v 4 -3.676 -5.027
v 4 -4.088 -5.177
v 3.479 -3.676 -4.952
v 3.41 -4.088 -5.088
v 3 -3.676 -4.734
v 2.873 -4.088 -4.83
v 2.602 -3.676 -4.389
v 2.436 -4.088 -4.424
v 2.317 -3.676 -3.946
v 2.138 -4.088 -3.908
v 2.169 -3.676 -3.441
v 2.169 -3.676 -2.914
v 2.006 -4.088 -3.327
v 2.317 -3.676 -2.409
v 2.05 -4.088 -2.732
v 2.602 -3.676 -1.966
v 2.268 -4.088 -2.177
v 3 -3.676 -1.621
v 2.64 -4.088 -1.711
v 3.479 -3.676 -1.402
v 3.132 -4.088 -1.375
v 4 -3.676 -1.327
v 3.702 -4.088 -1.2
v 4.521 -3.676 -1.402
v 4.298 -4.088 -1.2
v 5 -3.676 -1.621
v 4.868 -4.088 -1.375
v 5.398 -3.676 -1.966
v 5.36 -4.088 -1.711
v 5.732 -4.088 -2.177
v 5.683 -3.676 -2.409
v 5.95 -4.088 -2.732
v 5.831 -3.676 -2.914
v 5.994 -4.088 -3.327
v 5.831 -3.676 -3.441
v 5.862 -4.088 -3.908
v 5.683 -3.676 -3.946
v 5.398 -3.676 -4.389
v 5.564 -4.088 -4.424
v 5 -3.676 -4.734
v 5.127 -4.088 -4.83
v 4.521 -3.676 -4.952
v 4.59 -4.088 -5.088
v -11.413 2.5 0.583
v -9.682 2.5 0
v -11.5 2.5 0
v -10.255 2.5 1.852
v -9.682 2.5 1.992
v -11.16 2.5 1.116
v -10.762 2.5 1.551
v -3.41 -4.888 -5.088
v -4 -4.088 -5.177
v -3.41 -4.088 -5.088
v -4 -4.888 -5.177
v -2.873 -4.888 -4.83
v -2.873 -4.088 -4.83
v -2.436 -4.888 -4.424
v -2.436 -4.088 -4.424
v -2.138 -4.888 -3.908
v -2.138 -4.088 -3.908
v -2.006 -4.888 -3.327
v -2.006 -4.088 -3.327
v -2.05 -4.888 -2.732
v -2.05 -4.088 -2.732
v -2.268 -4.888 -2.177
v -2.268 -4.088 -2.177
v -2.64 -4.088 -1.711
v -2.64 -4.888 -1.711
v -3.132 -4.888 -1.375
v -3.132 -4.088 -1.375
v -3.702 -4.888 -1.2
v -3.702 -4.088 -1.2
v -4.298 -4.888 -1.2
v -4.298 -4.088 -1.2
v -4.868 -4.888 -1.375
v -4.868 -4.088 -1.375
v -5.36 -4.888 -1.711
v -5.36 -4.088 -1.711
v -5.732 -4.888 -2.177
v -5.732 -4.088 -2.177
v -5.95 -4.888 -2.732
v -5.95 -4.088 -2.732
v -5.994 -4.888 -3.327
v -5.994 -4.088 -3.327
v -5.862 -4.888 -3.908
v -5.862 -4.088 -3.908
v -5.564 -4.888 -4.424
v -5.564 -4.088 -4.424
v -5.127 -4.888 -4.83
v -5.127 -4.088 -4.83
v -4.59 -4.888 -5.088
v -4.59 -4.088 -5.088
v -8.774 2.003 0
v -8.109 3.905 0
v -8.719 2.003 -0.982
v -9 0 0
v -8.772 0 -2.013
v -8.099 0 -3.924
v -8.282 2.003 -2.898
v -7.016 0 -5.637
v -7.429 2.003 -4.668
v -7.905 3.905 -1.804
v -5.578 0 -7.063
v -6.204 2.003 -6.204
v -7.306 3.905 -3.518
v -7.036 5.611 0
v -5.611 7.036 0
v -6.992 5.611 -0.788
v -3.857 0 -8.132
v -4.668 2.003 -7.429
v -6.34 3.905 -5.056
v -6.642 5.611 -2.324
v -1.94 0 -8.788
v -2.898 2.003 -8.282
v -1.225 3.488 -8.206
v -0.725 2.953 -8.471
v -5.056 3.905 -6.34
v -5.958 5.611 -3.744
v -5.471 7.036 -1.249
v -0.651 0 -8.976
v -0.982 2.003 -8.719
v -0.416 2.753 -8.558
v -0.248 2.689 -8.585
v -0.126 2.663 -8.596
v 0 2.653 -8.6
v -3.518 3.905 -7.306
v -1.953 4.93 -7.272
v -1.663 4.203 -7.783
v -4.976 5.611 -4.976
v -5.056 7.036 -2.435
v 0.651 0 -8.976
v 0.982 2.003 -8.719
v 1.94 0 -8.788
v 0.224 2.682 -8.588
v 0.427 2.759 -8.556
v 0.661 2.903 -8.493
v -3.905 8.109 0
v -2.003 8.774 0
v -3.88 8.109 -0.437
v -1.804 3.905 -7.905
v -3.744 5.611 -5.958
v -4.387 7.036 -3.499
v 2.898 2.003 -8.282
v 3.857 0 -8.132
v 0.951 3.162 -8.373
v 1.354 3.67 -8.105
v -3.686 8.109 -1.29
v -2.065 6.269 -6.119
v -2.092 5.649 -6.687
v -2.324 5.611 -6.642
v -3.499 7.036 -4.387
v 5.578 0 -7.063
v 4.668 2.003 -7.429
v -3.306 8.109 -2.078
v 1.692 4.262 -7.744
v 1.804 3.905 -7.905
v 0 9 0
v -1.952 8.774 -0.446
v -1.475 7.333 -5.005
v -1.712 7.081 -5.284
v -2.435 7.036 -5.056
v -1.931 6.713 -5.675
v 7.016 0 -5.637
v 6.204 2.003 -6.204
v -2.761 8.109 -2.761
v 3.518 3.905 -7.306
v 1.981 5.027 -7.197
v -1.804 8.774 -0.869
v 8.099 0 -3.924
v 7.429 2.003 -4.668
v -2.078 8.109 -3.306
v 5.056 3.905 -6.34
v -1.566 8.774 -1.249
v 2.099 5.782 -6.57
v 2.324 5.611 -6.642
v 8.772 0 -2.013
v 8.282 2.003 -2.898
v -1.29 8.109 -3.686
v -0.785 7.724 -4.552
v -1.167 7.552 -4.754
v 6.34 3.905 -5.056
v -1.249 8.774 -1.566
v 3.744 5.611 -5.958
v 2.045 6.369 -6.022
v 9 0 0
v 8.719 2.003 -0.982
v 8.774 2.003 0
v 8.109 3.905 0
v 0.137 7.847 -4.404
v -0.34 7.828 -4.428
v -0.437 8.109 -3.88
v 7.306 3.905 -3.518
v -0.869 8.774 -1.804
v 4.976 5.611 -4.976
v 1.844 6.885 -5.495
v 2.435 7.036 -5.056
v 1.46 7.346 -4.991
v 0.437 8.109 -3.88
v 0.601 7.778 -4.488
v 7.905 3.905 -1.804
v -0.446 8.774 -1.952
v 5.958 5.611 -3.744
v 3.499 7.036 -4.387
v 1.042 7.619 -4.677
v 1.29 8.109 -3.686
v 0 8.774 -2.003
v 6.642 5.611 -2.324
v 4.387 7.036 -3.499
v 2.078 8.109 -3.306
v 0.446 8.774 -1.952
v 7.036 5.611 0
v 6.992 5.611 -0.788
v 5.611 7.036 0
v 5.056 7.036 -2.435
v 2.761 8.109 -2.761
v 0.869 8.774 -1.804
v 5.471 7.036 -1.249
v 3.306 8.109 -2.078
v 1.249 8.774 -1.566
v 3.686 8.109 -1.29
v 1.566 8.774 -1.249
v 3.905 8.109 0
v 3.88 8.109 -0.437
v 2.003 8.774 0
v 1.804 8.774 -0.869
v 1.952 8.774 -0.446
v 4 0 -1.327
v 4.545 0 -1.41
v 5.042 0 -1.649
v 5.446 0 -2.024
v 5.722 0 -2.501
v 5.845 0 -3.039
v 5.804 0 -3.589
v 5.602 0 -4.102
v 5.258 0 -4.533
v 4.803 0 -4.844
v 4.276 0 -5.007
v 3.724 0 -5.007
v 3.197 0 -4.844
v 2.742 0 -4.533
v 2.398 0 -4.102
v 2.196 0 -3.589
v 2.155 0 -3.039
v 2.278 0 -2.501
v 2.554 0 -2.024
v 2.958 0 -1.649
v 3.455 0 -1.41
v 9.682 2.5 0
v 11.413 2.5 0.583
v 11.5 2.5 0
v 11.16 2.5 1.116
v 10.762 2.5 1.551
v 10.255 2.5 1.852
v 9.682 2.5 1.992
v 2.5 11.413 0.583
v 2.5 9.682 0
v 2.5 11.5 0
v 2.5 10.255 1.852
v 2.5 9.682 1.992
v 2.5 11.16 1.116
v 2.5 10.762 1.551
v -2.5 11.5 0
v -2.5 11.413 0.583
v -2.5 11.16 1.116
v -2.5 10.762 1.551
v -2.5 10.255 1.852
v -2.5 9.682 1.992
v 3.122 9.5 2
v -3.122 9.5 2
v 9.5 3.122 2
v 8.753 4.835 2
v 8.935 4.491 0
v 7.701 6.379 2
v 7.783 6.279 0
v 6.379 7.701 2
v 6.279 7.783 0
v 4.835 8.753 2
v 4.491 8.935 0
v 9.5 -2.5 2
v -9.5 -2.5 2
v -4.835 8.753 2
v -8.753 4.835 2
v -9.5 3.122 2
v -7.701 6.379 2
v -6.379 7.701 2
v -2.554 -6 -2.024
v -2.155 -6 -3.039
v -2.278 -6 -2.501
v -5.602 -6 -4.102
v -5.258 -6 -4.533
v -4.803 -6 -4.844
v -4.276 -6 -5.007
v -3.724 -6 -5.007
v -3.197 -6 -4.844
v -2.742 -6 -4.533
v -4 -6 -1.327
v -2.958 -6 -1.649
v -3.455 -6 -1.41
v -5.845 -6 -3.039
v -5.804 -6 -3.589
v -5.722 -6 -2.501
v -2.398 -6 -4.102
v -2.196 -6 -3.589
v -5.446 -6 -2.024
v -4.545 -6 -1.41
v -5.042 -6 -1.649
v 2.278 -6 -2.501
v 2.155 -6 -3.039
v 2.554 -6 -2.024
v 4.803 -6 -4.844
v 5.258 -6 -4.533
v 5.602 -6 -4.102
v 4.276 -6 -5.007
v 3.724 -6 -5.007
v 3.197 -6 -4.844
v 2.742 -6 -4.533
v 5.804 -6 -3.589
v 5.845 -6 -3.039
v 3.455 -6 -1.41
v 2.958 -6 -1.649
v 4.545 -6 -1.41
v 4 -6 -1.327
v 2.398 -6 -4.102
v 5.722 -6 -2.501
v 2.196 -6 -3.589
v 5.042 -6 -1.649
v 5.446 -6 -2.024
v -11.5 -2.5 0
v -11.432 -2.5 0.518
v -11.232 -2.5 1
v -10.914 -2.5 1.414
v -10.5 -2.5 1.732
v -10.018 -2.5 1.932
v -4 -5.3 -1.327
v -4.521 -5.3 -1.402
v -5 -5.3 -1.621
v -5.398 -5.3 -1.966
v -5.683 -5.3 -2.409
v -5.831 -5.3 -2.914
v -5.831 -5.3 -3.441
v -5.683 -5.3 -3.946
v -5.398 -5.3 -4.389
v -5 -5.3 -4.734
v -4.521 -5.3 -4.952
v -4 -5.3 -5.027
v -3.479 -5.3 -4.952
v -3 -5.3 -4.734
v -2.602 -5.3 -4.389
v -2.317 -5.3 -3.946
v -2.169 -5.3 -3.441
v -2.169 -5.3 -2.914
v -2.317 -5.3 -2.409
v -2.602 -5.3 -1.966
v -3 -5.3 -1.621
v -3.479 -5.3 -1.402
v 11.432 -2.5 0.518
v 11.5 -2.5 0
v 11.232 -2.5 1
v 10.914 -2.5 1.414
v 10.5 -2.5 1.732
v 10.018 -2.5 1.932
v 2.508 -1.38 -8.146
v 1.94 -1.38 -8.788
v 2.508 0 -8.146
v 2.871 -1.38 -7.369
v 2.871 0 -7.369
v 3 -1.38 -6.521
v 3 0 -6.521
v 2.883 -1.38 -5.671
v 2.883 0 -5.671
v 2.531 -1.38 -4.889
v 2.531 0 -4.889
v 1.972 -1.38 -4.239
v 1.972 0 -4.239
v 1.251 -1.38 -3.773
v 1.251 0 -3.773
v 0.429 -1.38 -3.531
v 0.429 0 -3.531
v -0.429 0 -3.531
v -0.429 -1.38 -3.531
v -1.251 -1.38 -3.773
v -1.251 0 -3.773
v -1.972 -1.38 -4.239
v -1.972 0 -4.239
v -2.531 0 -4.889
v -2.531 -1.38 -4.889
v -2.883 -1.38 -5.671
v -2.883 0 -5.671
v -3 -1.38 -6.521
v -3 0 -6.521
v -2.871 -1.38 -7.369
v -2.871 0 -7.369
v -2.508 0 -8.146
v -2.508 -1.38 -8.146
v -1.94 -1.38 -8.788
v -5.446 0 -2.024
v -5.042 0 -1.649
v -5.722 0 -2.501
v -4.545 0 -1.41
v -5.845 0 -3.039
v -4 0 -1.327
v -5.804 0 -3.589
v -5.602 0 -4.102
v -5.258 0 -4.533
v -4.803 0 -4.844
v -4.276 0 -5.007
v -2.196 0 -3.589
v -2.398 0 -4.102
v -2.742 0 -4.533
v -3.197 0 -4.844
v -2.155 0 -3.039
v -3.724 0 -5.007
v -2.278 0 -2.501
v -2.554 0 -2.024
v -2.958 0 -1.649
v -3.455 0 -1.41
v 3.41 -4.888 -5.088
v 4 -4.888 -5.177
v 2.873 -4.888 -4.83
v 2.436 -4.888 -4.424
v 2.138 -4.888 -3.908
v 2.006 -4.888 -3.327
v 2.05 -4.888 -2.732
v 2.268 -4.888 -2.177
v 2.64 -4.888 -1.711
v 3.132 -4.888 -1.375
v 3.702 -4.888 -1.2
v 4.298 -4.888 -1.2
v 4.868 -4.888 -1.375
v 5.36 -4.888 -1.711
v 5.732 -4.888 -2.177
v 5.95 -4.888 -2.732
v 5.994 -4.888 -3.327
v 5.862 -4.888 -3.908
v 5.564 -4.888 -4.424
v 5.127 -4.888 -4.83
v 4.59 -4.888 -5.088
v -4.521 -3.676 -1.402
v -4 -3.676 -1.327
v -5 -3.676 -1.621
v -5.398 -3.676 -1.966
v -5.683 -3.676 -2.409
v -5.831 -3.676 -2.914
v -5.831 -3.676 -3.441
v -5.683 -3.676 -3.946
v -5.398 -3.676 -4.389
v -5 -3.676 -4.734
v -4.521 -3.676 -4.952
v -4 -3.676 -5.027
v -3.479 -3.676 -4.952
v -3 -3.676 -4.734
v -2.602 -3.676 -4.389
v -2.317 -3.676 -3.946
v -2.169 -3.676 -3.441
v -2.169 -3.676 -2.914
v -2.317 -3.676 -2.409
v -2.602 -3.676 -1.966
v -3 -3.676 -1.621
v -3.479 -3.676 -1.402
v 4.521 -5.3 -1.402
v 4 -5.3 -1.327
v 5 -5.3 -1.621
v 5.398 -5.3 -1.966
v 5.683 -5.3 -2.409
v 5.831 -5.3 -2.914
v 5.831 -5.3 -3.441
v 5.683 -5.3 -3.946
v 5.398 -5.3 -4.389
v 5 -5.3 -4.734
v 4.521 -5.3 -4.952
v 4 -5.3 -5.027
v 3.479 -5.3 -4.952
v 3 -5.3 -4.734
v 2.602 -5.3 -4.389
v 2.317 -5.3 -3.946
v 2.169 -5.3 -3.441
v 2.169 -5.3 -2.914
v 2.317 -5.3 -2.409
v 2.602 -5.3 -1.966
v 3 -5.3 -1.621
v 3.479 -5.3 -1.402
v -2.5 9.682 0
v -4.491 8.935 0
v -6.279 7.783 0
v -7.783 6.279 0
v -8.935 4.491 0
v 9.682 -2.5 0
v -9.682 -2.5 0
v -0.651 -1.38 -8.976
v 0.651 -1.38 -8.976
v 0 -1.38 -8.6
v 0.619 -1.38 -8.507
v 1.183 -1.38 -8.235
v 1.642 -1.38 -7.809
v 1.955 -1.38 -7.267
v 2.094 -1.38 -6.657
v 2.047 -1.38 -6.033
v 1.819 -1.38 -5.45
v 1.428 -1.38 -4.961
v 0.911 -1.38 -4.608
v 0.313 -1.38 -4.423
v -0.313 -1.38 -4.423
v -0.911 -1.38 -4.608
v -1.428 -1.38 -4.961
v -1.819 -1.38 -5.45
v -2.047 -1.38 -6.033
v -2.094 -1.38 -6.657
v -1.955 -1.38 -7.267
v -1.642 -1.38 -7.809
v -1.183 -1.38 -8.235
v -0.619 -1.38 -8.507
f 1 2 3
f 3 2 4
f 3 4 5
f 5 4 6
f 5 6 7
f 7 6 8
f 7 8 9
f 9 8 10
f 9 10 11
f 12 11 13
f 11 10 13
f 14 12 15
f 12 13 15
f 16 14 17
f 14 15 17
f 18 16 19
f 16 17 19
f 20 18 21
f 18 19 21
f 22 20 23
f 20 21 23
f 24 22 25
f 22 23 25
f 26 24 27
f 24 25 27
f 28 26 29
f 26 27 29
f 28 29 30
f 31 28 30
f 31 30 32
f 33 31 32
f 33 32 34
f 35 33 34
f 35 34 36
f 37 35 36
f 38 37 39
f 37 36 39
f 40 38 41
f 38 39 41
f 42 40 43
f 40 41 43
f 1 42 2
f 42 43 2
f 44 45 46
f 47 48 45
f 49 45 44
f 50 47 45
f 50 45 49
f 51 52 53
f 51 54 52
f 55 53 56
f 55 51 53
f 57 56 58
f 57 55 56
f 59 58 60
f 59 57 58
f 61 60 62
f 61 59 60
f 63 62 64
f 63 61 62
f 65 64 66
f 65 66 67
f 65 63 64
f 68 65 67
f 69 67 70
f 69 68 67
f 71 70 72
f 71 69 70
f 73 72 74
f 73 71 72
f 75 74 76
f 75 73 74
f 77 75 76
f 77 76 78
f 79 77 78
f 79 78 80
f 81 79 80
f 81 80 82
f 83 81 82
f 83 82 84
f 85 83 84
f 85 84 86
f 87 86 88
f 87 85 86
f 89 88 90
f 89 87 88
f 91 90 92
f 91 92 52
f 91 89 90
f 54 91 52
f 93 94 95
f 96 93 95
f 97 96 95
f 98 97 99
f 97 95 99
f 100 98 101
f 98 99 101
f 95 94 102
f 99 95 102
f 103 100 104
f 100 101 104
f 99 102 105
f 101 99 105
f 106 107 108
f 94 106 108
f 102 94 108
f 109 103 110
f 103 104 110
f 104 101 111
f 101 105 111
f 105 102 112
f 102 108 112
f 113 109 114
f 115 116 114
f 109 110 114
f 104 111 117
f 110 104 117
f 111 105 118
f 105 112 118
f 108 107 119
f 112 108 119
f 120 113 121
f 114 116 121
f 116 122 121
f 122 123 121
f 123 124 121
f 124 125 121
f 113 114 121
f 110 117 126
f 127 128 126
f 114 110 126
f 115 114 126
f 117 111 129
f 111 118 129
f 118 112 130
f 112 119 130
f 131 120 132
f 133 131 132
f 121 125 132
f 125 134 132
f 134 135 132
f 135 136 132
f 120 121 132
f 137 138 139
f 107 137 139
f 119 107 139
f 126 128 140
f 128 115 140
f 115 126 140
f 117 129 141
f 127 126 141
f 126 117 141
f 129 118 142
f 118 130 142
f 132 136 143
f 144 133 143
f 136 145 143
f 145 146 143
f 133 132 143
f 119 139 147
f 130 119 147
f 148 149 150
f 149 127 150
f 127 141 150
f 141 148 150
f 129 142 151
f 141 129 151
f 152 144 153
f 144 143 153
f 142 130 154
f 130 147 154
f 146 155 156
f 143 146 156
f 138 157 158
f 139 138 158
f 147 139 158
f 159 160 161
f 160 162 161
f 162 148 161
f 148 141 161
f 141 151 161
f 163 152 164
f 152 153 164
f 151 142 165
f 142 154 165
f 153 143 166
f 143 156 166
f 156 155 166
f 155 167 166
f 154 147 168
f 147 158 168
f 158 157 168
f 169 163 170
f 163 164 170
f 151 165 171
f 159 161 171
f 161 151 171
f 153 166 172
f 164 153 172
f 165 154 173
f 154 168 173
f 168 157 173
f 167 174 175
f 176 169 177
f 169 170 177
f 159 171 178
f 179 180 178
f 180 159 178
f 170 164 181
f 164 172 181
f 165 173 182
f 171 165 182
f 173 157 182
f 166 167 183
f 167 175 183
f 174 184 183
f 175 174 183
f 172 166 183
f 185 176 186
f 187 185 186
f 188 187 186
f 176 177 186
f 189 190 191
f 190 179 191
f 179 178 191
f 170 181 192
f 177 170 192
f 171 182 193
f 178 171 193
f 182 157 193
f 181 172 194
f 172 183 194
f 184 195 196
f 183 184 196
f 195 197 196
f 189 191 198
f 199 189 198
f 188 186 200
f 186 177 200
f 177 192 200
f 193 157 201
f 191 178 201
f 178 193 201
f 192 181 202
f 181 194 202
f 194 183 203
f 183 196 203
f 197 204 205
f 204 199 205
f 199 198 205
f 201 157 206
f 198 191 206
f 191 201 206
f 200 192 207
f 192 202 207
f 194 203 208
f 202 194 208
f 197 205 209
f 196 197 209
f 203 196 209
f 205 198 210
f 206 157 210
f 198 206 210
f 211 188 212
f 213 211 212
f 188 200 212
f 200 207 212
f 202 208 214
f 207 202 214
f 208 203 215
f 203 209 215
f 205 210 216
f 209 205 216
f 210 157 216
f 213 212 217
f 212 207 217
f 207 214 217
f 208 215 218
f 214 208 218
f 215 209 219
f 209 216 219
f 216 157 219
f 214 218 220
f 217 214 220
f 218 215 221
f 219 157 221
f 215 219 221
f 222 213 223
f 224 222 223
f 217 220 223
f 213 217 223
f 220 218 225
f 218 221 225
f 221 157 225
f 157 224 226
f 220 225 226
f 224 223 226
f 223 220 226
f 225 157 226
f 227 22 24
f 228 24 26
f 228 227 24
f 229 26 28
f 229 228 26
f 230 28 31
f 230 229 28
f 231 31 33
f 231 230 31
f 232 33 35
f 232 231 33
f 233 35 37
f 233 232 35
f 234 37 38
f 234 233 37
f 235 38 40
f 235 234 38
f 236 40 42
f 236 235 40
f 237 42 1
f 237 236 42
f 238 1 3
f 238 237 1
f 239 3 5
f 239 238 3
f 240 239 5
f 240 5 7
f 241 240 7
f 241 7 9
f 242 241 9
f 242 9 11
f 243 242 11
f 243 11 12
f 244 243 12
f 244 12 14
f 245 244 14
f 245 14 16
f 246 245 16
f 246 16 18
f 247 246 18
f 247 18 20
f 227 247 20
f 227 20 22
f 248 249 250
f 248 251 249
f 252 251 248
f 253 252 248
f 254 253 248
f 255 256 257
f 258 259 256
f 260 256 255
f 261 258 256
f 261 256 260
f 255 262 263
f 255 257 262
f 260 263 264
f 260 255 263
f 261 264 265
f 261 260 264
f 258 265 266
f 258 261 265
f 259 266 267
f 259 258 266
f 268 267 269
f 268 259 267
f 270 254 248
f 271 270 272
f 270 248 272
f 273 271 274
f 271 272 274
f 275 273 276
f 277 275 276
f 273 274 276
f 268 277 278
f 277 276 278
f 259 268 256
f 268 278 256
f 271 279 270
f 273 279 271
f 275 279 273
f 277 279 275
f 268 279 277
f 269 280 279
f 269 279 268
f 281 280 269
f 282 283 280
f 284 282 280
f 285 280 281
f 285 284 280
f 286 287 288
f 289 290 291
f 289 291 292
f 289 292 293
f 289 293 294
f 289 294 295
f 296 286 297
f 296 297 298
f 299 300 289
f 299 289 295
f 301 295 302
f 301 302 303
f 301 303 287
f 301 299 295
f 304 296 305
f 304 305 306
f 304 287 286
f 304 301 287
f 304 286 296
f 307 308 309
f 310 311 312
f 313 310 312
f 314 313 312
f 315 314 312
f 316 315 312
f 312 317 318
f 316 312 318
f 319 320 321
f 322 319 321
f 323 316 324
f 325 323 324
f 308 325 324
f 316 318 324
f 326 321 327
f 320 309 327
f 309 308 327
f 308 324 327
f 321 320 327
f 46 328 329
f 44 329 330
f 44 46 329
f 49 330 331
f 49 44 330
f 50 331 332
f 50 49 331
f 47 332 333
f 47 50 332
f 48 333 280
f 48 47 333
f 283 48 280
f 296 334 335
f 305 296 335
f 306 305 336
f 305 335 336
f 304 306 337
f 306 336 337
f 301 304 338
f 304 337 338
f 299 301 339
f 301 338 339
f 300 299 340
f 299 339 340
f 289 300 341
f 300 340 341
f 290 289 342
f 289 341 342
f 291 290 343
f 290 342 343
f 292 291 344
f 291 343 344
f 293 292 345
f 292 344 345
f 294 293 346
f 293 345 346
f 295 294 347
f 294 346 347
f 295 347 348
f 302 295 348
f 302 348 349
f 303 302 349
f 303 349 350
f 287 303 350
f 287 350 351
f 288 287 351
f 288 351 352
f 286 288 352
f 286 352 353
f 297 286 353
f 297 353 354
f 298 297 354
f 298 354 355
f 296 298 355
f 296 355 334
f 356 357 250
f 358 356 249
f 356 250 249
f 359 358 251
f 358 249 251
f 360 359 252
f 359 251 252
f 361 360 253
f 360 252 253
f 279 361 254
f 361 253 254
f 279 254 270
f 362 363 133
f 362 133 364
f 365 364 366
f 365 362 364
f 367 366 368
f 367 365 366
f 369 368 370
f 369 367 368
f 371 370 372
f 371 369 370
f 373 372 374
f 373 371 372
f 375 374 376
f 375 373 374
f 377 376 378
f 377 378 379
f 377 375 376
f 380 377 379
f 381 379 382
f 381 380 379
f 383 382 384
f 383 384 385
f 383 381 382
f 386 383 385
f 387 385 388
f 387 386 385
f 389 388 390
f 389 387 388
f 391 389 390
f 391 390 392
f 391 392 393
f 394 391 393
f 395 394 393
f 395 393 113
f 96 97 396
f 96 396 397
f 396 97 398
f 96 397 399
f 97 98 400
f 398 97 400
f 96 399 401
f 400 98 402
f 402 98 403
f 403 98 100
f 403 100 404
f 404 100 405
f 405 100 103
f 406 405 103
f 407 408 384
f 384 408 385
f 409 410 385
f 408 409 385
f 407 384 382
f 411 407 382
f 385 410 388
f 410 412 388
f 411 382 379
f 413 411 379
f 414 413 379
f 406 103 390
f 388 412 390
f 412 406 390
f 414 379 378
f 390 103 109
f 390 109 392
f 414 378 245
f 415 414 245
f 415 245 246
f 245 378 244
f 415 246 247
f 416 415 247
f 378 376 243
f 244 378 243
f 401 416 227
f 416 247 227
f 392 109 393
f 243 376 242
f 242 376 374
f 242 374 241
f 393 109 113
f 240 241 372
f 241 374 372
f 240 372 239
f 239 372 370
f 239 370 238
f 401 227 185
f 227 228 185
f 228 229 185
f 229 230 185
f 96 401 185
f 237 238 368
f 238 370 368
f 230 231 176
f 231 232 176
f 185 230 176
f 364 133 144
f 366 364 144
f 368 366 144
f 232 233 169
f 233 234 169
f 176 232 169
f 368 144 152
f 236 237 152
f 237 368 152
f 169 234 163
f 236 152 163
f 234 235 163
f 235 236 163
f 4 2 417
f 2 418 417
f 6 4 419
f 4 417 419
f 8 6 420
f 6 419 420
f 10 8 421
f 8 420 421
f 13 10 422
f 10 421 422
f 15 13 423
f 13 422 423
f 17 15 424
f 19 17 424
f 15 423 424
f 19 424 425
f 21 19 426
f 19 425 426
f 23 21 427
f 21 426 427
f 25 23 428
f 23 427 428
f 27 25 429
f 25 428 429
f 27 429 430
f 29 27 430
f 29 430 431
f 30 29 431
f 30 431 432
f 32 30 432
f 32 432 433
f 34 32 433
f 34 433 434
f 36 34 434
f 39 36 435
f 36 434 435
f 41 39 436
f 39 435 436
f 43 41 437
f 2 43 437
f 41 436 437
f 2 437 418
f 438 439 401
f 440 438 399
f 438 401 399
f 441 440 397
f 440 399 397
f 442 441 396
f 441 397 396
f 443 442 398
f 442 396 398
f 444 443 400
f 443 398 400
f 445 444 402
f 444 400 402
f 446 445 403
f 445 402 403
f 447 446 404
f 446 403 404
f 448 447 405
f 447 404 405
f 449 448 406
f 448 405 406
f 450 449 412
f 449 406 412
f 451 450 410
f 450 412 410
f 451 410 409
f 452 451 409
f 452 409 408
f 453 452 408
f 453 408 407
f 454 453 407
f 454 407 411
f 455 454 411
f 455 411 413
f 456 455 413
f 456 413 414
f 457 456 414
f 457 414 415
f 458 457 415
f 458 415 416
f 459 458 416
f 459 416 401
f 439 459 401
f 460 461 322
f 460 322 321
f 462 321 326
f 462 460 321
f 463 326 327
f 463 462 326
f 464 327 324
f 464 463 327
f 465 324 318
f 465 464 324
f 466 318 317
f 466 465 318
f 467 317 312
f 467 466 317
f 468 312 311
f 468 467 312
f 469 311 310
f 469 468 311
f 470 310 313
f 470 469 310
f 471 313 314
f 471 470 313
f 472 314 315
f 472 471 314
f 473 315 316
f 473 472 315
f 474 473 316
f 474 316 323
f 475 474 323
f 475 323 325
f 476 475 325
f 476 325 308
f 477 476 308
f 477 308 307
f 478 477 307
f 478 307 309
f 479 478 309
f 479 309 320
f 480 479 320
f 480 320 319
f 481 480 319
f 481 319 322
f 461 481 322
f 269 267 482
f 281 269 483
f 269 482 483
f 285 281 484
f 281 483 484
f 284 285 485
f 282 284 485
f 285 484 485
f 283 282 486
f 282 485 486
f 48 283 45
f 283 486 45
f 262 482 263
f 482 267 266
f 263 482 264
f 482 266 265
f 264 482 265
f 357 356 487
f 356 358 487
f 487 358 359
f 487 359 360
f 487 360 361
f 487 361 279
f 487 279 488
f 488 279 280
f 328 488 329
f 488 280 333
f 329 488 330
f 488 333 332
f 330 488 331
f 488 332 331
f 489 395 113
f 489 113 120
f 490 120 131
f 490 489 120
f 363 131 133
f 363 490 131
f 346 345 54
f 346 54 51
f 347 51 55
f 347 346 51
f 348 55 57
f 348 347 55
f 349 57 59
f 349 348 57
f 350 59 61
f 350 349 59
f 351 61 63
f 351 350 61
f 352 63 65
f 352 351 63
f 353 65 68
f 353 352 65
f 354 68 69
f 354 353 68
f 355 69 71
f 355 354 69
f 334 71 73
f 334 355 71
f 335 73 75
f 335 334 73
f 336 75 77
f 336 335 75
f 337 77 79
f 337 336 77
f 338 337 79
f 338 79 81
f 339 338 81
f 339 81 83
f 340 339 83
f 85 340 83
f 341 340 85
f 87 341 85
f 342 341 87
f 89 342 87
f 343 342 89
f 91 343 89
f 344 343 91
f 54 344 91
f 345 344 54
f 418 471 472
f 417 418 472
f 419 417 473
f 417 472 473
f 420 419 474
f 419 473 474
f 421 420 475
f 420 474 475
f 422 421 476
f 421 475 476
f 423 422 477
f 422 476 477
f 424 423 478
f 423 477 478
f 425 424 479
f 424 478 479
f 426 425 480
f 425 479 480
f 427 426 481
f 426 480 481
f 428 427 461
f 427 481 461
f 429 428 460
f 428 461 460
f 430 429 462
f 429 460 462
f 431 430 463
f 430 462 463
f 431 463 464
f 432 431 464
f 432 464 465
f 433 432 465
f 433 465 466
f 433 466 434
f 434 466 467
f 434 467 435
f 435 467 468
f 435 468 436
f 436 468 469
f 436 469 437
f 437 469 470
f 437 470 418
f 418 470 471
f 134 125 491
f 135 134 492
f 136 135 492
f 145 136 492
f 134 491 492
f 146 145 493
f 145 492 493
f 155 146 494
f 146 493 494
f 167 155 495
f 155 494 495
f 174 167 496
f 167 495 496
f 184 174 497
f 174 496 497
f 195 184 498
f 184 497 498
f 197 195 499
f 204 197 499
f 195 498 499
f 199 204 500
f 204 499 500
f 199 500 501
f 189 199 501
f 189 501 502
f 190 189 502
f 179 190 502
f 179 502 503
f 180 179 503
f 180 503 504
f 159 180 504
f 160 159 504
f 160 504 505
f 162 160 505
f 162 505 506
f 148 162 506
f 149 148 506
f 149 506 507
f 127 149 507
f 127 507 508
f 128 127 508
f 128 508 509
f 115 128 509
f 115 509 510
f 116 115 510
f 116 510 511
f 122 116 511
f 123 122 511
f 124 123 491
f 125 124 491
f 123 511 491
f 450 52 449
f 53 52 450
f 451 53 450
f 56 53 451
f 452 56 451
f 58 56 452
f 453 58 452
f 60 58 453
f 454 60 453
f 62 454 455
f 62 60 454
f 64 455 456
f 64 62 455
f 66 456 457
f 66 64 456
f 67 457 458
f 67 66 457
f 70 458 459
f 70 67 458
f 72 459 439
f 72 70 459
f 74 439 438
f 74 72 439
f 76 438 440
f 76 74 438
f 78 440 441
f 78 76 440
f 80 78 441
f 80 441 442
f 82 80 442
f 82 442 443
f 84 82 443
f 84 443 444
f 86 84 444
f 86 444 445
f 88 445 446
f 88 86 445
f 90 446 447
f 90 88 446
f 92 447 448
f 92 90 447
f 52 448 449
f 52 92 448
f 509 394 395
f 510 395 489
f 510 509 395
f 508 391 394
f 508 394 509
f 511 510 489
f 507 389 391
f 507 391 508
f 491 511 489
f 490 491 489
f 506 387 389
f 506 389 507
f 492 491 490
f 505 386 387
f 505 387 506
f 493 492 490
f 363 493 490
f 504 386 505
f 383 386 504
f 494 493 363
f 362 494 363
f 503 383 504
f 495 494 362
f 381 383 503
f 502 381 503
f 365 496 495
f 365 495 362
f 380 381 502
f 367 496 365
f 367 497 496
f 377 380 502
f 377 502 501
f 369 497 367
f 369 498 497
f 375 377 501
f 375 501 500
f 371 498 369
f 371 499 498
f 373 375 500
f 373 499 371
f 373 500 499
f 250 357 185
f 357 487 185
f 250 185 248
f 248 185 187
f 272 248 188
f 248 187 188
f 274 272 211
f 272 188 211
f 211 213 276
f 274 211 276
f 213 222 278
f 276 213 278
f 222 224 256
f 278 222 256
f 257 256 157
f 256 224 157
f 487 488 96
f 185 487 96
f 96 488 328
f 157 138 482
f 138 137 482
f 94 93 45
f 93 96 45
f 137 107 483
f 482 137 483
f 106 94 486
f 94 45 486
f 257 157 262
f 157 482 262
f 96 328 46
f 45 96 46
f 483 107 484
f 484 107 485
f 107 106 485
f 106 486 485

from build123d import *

# Parameters (mm, degrees)
SKETCH_1_R               = 10
EXTRUDE_1_DEPTH          = 2
REVOLVE_1_ANGLE          = 180
SKETCH_5_R               = 2.1
CUT_EXTRUDE_1_DEPTH      = 10
SKETCH_6_R               = 1.85
EXTRUDE_2_DEPTH          = 6
EXTRUDE_START            = 1.38
SKETCH_7_R               = 2.1
EXTRUDE_3_DEPTH          = 1.38
SKETCH_10_W              = 5
SKETCH_10_H              = 23
EXTRUDE_4_DEPTH          = 2
PATTERN_CIRCULAR_3_COUNT = 4
FILLET_3_R               = 2
SKETCH_11_W              = 19.364916732
SKETCH_11_H              = 12.045075347
CUT_EXTRUDE_2_DEPTH      = 10


with BuildPart() as part:
    # 草图1 → 凸台-拉伸1 (new body)
    with BuildSketch(Plane.XY):
        Circle(SKETCH_1_R)
    extrude(amount=EXTRUDE_1_DEPTH)

    # 草图2 → 旋转1 (revolve)
    with BuildSketch(Plane(origin=(0, 0, 0), x_dir=(-1, 0, 0), z_dir=(0, 0, -1))):
        with BuildLine():
            Line((0, 9), (0, 0))
            Line((0, 0), (9, 0))
            ThreePointArc((9, 0), (6.363961031, 6.363961031), (0, 9))
        make_face()
    revolve(axis=Axis((0, 0, 0), (0, -1, 0)), revolution_arc=REVOLVE_1_ANGLE)

    # 草图5 → 切除-拉伸1 (cut)
    with BuildSketch(Plane.XZ):
        with Locations(Location((0, -6.5, 0), (0, 0, 270))):
            Circle(SKETCH_5_R)
    extrude(amount=-CUT_EXTRUDE_1_DEPTH, mode=Mode.SUBTRACT)

    # 草图6 → 凸台-拉伸2 (add)
    with BuildSketch(Plane.XZ):
        with Locations(Location((-4, -3.177350455, 0), (0, 0, 90))):
            Circle(SKETCH_6_R)
    extrude_2 = extrude(amount=EXTRUDE_2_DEPTH)

    # 镜向1: 凸台-拉伸2 across plane
    add(extrude_2.mirror(Plane(origin=(0, 0, 0), x_dir=(0, 0, 1), z_dir=(1, 0, 0))))

    # 草图7 → 凸台-拉伸3 (add)
    with BuildSketch(Plane.XZ.offset(EXTRUDE_START)):
        with BuildLine():
            ThreePointArc((1.939830866, -8.788461538), (0, -3.5), (-1.939830866, -8.788461538))
            ThreePointArc((-1.939830866, -8.788461538), (0, -9), (1.939830866, -8.788461538))
        make_face()
        with Locations(Location((0, -6.5, 0), (0, 0, 270))):
            Circle(SKETCH_7_R, mode=Mode.SUBTRACT)
    extrude(amount=-EXTRUDE_3_DEPTH)

    # 草图8 → 旋转2 (revolve)
    with BuildSketch(Plane.XY.offset(-3.177350455), mode=Mode.PRIVATE) as revolve_2_sk:
        Polygon((4, -3.675756774), (2.15, -3.675756774), (2, -4.087878387), (2, -4.887878387), (2.15, -5.3), (4, -5.3), align=None)
    revolve_2 = revolve(revolve_2_sk.sketch.rotate(Axis((4, -5.3, -3.177350455), (0, 1, 0)), 270), axis=Axis((4, -5.3, -3.177350455), (0, 1, 0)))

    # 镜向2: 旋转2 across plane
    add(revolve_2.mirror(Plane(origin=(0, 0, 0), x_dir=(0, 0, 1), z_dir=(1, 0, 0))))

    # 草图10 → 凸台-拉伸4 (add)
    with BuildSketch(Plane.XY.offset(2)):
        Rectangle(SKETCH_10_W, SKETCH_10_H)
    extrude_4 = extrude(amount=-EXTRUDE_4_DEPTH)

    # 阵列(圆周)3: 凸台-拉伸4 ×4 about axis
    pattern_circular_3_axis = Axis((0, 0, 0), (0, 0, 1))
    for i in range(1, PATTERN_CIRCULAR_3_COUNT):
        add(extrude_4.rotate(pattern_circular_3_axis, i * 360 / PATTERN_CIRCULAR_3_COUNT))

    # 圆角3
    fillet_3_edges = [part.edges().sort_by_distance(p)[0] for p in [
        (0, 11.5, 2),
        (0, -11.5, 2),
        (11.5, 0, 2),
        (-11.5, 0, 2),
    ]]
    fillet(fillet_3_edges, radius=FILLET_3_R - 0.0001)  # a hair under: the kernel refuses the full size

    # 草图11 → 切除-拉伸2 (cut)
    with BuildSketch(Plane(origin=(0, 0, 0), x_dir=(-1, 0, 0), z_dir=(0, 0, -1))):
        with Locations((0, -8.522537674)):
            Rectangle(SKETCH_11_W, SKETCH_11_H)
    extrude(amount=-CUT_EXTRUDE_2_DEPTH, mode=Mode.SUBTRACT)


solid = part.part
